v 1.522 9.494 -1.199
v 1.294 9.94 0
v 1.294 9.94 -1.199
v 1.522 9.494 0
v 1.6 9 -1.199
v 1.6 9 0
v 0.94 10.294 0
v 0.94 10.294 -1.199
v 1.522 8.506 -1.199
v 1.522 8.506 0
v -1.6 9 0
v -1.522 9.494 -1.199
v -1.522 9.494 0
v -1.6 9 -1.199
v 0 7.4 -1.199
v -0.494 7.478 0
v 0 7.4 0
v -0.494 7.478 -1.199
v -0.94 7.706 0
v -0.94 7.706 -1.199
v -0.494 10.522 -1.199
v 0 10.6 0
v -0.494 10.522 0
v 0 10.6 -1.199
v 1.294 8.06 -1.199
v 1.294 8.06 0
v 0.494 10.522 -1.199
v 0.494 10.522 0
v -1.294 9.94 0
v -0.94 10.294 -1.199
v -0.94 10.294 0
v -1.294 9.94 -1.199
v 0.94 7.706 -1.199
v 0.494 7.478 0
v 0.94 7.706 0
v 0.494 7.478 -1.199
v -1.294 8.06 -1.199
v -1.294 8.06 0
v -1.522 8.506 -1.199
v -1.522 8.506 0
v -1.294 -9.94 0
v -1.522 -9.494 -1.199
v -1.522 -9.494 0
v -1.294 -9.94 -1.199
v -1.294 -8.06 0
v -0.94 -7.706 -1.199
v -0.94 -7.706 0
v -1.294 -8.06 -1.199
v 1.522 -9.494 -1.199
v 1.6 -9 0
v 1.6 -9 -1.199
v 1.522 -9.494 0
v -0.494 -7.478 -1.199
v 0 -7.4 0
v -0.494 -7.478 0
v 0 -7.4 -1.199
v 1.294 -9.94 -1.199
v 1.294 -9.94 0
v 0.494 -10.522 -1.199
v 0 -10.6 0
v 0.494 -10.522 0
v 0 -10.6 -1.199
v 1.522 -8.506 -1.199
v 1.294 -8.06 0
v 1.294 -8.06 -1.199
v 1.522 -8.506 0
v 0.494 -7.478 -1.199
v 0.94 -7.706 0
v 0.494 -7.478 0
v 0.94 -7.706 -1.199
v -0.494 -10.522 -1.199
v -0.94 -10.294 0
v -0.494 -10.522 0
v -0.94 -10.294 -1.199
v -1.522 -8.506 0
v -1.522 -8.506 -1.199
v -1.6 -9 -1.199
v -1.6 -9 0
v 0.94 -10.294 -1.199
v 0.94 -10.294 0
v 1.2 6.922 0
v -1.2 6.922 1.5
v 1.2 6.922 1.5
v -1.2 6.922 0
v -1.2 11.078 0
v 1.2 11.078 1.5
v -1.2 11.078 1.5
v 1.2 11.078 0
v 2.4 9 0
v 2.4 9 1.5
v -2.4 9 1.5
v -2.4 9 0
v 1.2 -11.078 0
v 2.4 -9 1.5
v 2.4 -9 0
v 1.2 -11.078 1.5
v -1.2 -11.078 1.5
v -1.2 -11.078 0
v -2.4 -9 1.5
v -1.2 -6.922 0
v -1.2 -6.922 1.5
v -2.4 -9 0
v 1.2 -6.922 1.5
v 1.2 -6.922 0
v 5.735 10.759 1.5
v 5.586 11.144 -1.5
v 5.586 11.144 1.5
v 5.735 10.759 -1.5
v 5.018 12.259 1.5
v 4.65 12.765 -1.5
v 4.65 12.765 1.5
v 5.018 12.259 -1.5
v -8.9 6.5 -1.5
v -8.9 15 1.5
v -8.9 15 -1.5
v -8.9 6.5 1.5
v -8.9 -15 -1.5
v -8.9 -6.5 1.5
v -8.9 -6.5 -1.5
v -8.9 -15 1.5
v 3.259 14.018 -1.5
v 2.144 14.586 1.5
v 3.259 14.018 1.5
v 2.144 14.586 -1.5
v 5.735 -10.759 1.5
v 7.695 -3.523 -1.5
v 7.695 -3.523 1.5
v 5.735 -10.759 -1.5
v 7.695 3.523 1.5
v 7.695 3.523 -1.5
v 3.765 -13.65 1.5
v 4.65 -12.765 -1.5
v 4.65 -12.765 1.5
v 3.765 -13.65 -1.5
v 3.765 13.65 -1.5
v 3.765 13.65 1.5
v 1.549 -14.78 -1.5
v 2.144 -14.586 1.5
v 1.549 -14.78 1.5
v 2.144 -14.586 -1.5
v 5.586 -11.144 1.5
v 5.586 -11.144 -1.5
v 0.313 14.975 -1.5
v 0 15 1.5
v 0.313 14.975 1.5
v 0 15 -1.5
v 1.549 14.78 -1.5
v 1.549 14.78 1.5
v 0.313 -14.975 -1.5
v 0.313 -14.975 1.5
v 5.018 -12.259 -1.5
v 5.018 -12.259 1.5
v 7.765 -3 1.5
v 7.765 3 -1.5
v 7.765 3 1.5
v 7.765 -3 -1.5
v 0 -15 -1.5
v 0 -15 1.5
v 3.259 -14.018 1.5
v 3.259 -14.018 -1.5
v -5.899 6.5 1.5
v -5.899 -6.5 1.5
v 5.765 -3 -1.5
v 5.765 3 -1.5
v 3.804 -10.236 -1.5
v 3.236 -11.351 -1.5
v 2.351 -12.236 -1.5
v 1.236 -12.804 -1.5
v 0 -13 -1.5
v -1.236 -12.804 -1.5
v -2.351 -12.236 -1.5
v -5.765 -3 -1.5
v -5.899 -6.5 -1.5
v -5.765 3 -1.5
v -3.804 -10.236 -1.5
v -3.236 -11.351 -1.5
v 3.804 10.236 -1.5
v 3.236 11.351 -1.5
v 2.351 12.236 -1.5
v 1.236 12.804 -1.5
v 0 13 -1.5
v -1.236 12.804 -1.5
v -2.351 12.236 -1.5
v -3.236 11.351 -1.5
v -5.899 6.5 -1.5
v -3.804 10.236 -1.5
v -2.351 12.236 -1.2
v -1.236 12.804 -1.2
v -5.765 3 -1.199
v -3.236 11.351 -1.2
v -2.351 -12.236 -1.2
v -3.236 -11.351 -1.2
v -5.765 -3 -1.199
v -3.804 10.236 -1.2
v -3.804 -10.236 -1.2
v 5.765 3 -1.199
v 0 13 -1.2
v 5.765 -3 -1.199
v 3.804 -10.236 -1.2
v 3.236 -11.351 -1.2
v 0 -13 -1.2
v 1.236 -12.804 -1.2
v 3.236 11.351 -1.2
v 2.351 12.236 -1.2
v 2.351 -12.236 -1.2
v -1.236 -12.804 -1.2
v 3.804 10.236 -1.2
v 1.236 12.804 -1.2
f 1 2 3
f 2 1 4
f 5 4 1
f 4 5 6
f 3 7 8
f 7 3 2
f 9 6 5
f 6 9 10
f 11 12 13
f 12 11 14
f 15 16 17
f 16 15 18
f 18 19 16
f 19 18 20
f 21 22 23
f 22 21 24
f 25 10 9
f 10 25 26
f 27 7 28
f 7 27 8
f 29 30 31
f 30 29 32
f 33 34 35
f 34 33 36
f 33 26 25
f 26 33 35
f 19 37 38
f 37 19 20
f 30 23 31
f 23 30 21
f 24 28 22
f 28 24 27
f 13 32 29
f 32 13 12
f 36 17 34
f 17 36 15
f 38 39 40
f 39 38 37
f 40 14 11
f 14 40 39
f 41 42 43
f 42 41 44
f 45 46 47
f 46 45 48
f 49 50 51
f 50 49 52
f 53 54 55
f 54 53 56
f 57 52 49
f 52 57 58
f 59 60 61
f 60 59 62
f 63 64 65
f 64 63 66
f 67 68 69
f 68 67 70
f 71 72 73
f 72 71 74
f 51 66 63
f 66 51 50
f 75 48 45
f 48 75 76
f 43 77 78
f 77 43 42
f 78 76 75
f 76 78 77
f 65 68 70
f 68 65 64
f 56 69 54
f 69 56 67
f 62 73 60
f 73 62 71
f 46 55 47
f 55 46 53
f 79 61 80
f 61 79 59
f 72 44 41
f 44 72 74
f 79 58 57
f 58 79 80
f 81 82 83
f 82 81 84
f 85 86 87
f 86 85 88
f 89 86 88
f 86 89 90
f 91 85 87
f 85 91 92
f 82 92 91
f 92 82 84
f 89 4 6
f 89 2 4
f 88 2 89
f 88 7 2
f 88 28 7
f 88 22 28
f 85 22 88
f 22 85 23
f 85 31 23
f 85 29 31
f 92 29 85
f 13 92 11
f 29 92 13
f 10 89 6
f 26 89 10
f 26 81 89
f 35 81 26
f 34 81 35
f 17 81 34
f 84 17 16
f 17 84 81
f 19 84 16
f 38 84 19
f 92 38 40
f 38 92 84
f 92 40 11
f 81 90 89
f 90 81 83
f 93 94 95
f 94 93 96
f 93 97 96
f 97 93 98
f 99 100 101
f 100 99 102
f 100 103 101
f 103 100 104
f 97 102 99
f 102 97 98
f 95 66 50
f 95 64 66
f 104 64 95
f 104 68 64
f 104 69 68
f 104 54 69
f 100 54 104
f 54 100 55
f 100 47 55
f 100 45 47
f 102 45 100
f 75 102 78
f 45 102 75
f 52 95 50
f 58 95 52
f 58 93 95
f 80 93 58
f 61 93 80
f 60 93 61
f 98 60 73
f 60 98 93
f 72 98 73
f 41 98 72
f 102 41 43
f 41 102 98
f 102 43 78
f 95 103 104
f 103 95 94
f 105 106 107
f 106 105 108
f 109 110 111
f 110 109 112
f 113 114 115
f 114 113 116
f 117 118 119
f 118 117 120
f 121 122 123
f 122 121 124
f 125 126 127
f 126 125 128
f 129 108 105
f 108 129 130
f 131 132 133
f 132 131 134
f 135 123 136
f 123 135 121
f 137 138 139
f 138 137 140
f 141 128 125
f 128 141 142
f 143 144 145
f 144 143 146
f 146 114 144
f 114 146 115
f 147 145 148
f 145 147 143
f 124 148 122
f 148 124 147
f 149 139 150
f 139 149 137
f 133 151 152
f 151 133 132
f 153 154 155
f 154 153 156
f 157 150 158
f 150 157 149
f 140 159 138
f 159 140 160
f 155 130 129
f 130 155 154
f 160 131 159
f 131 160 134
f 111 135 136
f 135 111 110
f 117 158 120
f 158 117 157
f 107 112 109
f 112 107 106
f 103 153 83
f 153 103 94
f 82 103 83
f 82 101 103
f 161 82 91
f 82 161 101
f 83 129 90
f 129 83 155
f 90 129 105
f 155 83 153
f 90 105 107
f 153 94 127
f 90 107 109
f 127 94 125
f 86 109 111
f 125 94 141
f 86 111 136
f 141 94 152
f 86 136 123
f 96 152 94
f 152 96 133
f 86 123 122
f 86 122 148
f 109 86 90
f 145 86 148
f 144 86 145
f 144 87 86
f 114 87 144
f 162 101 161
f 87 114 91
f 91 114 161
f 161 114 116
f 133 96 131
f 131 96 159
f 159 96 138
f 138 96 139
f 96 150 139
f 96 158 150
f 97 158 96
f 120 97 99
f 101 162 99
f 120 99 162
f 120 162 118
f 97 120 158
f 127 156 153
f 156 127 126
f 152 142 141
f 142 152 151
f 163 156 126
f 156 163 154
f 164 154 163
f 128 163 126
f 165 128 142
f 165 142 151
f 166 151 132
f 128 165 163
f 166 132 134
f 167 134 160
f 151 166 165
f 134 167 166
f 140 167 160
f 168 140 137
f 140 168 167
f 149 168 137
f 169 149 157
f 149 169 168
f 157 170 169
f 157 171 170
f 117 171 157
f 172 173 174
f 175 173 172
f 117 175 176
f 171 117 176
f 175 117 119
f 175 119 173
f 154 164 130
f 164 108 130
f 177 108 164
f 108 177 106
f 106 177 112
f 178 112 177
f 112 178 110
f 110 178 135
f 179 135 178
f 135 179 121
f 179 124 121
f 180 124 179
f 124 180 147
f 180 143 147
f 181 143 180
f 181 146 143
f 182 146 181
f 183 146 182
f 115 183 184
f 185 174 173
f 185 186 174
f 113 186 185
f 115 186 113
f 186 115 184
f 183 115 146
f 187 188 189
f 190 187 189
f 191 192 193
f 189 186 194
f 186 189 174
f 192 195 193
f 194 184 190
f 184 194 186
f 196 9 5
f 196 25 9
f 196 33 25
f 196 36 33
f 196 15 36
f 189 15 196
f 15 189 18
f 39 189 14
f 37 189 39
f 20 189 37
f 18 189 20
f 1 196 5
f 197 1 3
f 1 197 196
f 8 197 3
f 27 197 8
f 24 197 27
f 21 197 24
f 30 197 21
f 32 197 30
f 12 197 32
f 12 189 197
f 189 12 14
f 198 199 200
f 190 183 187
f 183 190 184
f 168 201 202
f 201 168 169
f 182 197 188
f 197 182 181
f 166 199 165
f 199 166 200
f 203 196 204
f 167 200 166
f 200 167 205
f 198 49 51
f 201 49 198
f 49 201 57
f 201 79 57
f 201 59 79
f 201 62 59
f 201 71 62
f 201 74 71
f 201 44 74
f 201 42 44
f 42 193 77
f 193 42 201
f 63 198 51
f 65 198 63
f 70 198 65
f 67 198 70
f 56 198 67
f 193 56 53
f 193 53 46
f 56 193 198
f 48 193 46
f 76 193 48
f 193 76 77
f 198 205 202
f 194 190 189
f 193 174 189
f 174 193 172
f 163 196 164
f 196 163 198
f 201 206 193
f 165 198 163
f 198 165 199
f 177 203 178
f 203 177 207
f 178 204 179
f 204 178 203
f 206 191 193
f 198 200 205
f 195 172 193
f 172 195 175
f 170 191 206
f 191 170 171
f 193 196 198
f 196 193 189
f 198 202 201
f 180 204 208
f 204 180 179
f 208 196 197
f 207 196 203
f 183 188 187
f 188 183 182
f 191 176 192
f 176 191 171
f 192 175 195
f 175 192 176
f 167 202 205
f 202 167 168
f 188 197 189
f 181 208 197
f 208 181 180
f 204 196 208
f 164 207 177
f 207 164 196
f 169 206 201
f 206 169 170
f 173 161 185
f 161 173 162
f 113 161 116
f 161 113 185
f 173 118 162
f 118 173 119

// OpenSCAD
module copy_mirror(vec=[0,1,0])
{
    children();
    mirror(vec) children();
}


module bltouch_outside_profile()
{
    HEIGHT=.301;
    OR=4;
    C_XOFF=0;
    C_YOFF=9;
    S_H=11.53;
    S_W=6;
    XI=S_H/2 - C_XOFF;
    YI=S_W/2 - C_YOFF;
    SQRT = sqrt(pow(XI,2) +pow(YI,2)-pow(OR,2));
    X1= ((pow(OR,2)*XI - OR*YI*SQRT)/(pow(XI,2)+pow(YI,2)))+C_XOFF;
    Y1= ((pow(OR,2)*YI + OR*XI*SQRT)/(pow(XI,2)+pow(YI,2)))+C_YOFF;
    hull(){
        cube(size=[S_H, S_W, HEIGHT], center=true);
        copy_mirror([0,1,0]){
            translate([0, C_YOFF, 0]) {
                cylinder(h=HEIGHT, r=OR, center=true, $fn=20);
            }
        }
        /*copy_mirror([0,1,0]) linear_extrude(HEIGHT, center=true) {
            polygon(points=[[S_H/2,S_W/2],
                            [S_H/-2,S_W/2],
                            [-X1,Y1],
                            [X1,Y1]]);
        }*/
    }
}


module bltouch_bracket()
{
difference()
{
    hull(){
        linear_extrude (3, center=true){
            offset(r=2)projection() bltouch_outside_profile();
        }
        translate([-8.9/2,0,0]) cube([8.9,18+8+2*2,3], center=true);
    }
    translate([0,0,.15-1.5]) bltouch_outside_profile();
    copy_mirror([0,1,0]) translate([0,9,0]) cylinder(h=20,r=3.2/2, center=true, $fn=20);
    translate([1.5-8.9,0,0]) cube([3.001,13,20], center=true);

    copy_mirror()translate([0,9,0]) cylinder (r=2.4, h=1.501, $fn=6);
}
}
bltouch_bracket();
//bottom to nozzle 19mm
//bltouch total 41.8mm
//22.8mm upis where it should res
//middle should be 8.5mm 
//plugs=13x3mm
